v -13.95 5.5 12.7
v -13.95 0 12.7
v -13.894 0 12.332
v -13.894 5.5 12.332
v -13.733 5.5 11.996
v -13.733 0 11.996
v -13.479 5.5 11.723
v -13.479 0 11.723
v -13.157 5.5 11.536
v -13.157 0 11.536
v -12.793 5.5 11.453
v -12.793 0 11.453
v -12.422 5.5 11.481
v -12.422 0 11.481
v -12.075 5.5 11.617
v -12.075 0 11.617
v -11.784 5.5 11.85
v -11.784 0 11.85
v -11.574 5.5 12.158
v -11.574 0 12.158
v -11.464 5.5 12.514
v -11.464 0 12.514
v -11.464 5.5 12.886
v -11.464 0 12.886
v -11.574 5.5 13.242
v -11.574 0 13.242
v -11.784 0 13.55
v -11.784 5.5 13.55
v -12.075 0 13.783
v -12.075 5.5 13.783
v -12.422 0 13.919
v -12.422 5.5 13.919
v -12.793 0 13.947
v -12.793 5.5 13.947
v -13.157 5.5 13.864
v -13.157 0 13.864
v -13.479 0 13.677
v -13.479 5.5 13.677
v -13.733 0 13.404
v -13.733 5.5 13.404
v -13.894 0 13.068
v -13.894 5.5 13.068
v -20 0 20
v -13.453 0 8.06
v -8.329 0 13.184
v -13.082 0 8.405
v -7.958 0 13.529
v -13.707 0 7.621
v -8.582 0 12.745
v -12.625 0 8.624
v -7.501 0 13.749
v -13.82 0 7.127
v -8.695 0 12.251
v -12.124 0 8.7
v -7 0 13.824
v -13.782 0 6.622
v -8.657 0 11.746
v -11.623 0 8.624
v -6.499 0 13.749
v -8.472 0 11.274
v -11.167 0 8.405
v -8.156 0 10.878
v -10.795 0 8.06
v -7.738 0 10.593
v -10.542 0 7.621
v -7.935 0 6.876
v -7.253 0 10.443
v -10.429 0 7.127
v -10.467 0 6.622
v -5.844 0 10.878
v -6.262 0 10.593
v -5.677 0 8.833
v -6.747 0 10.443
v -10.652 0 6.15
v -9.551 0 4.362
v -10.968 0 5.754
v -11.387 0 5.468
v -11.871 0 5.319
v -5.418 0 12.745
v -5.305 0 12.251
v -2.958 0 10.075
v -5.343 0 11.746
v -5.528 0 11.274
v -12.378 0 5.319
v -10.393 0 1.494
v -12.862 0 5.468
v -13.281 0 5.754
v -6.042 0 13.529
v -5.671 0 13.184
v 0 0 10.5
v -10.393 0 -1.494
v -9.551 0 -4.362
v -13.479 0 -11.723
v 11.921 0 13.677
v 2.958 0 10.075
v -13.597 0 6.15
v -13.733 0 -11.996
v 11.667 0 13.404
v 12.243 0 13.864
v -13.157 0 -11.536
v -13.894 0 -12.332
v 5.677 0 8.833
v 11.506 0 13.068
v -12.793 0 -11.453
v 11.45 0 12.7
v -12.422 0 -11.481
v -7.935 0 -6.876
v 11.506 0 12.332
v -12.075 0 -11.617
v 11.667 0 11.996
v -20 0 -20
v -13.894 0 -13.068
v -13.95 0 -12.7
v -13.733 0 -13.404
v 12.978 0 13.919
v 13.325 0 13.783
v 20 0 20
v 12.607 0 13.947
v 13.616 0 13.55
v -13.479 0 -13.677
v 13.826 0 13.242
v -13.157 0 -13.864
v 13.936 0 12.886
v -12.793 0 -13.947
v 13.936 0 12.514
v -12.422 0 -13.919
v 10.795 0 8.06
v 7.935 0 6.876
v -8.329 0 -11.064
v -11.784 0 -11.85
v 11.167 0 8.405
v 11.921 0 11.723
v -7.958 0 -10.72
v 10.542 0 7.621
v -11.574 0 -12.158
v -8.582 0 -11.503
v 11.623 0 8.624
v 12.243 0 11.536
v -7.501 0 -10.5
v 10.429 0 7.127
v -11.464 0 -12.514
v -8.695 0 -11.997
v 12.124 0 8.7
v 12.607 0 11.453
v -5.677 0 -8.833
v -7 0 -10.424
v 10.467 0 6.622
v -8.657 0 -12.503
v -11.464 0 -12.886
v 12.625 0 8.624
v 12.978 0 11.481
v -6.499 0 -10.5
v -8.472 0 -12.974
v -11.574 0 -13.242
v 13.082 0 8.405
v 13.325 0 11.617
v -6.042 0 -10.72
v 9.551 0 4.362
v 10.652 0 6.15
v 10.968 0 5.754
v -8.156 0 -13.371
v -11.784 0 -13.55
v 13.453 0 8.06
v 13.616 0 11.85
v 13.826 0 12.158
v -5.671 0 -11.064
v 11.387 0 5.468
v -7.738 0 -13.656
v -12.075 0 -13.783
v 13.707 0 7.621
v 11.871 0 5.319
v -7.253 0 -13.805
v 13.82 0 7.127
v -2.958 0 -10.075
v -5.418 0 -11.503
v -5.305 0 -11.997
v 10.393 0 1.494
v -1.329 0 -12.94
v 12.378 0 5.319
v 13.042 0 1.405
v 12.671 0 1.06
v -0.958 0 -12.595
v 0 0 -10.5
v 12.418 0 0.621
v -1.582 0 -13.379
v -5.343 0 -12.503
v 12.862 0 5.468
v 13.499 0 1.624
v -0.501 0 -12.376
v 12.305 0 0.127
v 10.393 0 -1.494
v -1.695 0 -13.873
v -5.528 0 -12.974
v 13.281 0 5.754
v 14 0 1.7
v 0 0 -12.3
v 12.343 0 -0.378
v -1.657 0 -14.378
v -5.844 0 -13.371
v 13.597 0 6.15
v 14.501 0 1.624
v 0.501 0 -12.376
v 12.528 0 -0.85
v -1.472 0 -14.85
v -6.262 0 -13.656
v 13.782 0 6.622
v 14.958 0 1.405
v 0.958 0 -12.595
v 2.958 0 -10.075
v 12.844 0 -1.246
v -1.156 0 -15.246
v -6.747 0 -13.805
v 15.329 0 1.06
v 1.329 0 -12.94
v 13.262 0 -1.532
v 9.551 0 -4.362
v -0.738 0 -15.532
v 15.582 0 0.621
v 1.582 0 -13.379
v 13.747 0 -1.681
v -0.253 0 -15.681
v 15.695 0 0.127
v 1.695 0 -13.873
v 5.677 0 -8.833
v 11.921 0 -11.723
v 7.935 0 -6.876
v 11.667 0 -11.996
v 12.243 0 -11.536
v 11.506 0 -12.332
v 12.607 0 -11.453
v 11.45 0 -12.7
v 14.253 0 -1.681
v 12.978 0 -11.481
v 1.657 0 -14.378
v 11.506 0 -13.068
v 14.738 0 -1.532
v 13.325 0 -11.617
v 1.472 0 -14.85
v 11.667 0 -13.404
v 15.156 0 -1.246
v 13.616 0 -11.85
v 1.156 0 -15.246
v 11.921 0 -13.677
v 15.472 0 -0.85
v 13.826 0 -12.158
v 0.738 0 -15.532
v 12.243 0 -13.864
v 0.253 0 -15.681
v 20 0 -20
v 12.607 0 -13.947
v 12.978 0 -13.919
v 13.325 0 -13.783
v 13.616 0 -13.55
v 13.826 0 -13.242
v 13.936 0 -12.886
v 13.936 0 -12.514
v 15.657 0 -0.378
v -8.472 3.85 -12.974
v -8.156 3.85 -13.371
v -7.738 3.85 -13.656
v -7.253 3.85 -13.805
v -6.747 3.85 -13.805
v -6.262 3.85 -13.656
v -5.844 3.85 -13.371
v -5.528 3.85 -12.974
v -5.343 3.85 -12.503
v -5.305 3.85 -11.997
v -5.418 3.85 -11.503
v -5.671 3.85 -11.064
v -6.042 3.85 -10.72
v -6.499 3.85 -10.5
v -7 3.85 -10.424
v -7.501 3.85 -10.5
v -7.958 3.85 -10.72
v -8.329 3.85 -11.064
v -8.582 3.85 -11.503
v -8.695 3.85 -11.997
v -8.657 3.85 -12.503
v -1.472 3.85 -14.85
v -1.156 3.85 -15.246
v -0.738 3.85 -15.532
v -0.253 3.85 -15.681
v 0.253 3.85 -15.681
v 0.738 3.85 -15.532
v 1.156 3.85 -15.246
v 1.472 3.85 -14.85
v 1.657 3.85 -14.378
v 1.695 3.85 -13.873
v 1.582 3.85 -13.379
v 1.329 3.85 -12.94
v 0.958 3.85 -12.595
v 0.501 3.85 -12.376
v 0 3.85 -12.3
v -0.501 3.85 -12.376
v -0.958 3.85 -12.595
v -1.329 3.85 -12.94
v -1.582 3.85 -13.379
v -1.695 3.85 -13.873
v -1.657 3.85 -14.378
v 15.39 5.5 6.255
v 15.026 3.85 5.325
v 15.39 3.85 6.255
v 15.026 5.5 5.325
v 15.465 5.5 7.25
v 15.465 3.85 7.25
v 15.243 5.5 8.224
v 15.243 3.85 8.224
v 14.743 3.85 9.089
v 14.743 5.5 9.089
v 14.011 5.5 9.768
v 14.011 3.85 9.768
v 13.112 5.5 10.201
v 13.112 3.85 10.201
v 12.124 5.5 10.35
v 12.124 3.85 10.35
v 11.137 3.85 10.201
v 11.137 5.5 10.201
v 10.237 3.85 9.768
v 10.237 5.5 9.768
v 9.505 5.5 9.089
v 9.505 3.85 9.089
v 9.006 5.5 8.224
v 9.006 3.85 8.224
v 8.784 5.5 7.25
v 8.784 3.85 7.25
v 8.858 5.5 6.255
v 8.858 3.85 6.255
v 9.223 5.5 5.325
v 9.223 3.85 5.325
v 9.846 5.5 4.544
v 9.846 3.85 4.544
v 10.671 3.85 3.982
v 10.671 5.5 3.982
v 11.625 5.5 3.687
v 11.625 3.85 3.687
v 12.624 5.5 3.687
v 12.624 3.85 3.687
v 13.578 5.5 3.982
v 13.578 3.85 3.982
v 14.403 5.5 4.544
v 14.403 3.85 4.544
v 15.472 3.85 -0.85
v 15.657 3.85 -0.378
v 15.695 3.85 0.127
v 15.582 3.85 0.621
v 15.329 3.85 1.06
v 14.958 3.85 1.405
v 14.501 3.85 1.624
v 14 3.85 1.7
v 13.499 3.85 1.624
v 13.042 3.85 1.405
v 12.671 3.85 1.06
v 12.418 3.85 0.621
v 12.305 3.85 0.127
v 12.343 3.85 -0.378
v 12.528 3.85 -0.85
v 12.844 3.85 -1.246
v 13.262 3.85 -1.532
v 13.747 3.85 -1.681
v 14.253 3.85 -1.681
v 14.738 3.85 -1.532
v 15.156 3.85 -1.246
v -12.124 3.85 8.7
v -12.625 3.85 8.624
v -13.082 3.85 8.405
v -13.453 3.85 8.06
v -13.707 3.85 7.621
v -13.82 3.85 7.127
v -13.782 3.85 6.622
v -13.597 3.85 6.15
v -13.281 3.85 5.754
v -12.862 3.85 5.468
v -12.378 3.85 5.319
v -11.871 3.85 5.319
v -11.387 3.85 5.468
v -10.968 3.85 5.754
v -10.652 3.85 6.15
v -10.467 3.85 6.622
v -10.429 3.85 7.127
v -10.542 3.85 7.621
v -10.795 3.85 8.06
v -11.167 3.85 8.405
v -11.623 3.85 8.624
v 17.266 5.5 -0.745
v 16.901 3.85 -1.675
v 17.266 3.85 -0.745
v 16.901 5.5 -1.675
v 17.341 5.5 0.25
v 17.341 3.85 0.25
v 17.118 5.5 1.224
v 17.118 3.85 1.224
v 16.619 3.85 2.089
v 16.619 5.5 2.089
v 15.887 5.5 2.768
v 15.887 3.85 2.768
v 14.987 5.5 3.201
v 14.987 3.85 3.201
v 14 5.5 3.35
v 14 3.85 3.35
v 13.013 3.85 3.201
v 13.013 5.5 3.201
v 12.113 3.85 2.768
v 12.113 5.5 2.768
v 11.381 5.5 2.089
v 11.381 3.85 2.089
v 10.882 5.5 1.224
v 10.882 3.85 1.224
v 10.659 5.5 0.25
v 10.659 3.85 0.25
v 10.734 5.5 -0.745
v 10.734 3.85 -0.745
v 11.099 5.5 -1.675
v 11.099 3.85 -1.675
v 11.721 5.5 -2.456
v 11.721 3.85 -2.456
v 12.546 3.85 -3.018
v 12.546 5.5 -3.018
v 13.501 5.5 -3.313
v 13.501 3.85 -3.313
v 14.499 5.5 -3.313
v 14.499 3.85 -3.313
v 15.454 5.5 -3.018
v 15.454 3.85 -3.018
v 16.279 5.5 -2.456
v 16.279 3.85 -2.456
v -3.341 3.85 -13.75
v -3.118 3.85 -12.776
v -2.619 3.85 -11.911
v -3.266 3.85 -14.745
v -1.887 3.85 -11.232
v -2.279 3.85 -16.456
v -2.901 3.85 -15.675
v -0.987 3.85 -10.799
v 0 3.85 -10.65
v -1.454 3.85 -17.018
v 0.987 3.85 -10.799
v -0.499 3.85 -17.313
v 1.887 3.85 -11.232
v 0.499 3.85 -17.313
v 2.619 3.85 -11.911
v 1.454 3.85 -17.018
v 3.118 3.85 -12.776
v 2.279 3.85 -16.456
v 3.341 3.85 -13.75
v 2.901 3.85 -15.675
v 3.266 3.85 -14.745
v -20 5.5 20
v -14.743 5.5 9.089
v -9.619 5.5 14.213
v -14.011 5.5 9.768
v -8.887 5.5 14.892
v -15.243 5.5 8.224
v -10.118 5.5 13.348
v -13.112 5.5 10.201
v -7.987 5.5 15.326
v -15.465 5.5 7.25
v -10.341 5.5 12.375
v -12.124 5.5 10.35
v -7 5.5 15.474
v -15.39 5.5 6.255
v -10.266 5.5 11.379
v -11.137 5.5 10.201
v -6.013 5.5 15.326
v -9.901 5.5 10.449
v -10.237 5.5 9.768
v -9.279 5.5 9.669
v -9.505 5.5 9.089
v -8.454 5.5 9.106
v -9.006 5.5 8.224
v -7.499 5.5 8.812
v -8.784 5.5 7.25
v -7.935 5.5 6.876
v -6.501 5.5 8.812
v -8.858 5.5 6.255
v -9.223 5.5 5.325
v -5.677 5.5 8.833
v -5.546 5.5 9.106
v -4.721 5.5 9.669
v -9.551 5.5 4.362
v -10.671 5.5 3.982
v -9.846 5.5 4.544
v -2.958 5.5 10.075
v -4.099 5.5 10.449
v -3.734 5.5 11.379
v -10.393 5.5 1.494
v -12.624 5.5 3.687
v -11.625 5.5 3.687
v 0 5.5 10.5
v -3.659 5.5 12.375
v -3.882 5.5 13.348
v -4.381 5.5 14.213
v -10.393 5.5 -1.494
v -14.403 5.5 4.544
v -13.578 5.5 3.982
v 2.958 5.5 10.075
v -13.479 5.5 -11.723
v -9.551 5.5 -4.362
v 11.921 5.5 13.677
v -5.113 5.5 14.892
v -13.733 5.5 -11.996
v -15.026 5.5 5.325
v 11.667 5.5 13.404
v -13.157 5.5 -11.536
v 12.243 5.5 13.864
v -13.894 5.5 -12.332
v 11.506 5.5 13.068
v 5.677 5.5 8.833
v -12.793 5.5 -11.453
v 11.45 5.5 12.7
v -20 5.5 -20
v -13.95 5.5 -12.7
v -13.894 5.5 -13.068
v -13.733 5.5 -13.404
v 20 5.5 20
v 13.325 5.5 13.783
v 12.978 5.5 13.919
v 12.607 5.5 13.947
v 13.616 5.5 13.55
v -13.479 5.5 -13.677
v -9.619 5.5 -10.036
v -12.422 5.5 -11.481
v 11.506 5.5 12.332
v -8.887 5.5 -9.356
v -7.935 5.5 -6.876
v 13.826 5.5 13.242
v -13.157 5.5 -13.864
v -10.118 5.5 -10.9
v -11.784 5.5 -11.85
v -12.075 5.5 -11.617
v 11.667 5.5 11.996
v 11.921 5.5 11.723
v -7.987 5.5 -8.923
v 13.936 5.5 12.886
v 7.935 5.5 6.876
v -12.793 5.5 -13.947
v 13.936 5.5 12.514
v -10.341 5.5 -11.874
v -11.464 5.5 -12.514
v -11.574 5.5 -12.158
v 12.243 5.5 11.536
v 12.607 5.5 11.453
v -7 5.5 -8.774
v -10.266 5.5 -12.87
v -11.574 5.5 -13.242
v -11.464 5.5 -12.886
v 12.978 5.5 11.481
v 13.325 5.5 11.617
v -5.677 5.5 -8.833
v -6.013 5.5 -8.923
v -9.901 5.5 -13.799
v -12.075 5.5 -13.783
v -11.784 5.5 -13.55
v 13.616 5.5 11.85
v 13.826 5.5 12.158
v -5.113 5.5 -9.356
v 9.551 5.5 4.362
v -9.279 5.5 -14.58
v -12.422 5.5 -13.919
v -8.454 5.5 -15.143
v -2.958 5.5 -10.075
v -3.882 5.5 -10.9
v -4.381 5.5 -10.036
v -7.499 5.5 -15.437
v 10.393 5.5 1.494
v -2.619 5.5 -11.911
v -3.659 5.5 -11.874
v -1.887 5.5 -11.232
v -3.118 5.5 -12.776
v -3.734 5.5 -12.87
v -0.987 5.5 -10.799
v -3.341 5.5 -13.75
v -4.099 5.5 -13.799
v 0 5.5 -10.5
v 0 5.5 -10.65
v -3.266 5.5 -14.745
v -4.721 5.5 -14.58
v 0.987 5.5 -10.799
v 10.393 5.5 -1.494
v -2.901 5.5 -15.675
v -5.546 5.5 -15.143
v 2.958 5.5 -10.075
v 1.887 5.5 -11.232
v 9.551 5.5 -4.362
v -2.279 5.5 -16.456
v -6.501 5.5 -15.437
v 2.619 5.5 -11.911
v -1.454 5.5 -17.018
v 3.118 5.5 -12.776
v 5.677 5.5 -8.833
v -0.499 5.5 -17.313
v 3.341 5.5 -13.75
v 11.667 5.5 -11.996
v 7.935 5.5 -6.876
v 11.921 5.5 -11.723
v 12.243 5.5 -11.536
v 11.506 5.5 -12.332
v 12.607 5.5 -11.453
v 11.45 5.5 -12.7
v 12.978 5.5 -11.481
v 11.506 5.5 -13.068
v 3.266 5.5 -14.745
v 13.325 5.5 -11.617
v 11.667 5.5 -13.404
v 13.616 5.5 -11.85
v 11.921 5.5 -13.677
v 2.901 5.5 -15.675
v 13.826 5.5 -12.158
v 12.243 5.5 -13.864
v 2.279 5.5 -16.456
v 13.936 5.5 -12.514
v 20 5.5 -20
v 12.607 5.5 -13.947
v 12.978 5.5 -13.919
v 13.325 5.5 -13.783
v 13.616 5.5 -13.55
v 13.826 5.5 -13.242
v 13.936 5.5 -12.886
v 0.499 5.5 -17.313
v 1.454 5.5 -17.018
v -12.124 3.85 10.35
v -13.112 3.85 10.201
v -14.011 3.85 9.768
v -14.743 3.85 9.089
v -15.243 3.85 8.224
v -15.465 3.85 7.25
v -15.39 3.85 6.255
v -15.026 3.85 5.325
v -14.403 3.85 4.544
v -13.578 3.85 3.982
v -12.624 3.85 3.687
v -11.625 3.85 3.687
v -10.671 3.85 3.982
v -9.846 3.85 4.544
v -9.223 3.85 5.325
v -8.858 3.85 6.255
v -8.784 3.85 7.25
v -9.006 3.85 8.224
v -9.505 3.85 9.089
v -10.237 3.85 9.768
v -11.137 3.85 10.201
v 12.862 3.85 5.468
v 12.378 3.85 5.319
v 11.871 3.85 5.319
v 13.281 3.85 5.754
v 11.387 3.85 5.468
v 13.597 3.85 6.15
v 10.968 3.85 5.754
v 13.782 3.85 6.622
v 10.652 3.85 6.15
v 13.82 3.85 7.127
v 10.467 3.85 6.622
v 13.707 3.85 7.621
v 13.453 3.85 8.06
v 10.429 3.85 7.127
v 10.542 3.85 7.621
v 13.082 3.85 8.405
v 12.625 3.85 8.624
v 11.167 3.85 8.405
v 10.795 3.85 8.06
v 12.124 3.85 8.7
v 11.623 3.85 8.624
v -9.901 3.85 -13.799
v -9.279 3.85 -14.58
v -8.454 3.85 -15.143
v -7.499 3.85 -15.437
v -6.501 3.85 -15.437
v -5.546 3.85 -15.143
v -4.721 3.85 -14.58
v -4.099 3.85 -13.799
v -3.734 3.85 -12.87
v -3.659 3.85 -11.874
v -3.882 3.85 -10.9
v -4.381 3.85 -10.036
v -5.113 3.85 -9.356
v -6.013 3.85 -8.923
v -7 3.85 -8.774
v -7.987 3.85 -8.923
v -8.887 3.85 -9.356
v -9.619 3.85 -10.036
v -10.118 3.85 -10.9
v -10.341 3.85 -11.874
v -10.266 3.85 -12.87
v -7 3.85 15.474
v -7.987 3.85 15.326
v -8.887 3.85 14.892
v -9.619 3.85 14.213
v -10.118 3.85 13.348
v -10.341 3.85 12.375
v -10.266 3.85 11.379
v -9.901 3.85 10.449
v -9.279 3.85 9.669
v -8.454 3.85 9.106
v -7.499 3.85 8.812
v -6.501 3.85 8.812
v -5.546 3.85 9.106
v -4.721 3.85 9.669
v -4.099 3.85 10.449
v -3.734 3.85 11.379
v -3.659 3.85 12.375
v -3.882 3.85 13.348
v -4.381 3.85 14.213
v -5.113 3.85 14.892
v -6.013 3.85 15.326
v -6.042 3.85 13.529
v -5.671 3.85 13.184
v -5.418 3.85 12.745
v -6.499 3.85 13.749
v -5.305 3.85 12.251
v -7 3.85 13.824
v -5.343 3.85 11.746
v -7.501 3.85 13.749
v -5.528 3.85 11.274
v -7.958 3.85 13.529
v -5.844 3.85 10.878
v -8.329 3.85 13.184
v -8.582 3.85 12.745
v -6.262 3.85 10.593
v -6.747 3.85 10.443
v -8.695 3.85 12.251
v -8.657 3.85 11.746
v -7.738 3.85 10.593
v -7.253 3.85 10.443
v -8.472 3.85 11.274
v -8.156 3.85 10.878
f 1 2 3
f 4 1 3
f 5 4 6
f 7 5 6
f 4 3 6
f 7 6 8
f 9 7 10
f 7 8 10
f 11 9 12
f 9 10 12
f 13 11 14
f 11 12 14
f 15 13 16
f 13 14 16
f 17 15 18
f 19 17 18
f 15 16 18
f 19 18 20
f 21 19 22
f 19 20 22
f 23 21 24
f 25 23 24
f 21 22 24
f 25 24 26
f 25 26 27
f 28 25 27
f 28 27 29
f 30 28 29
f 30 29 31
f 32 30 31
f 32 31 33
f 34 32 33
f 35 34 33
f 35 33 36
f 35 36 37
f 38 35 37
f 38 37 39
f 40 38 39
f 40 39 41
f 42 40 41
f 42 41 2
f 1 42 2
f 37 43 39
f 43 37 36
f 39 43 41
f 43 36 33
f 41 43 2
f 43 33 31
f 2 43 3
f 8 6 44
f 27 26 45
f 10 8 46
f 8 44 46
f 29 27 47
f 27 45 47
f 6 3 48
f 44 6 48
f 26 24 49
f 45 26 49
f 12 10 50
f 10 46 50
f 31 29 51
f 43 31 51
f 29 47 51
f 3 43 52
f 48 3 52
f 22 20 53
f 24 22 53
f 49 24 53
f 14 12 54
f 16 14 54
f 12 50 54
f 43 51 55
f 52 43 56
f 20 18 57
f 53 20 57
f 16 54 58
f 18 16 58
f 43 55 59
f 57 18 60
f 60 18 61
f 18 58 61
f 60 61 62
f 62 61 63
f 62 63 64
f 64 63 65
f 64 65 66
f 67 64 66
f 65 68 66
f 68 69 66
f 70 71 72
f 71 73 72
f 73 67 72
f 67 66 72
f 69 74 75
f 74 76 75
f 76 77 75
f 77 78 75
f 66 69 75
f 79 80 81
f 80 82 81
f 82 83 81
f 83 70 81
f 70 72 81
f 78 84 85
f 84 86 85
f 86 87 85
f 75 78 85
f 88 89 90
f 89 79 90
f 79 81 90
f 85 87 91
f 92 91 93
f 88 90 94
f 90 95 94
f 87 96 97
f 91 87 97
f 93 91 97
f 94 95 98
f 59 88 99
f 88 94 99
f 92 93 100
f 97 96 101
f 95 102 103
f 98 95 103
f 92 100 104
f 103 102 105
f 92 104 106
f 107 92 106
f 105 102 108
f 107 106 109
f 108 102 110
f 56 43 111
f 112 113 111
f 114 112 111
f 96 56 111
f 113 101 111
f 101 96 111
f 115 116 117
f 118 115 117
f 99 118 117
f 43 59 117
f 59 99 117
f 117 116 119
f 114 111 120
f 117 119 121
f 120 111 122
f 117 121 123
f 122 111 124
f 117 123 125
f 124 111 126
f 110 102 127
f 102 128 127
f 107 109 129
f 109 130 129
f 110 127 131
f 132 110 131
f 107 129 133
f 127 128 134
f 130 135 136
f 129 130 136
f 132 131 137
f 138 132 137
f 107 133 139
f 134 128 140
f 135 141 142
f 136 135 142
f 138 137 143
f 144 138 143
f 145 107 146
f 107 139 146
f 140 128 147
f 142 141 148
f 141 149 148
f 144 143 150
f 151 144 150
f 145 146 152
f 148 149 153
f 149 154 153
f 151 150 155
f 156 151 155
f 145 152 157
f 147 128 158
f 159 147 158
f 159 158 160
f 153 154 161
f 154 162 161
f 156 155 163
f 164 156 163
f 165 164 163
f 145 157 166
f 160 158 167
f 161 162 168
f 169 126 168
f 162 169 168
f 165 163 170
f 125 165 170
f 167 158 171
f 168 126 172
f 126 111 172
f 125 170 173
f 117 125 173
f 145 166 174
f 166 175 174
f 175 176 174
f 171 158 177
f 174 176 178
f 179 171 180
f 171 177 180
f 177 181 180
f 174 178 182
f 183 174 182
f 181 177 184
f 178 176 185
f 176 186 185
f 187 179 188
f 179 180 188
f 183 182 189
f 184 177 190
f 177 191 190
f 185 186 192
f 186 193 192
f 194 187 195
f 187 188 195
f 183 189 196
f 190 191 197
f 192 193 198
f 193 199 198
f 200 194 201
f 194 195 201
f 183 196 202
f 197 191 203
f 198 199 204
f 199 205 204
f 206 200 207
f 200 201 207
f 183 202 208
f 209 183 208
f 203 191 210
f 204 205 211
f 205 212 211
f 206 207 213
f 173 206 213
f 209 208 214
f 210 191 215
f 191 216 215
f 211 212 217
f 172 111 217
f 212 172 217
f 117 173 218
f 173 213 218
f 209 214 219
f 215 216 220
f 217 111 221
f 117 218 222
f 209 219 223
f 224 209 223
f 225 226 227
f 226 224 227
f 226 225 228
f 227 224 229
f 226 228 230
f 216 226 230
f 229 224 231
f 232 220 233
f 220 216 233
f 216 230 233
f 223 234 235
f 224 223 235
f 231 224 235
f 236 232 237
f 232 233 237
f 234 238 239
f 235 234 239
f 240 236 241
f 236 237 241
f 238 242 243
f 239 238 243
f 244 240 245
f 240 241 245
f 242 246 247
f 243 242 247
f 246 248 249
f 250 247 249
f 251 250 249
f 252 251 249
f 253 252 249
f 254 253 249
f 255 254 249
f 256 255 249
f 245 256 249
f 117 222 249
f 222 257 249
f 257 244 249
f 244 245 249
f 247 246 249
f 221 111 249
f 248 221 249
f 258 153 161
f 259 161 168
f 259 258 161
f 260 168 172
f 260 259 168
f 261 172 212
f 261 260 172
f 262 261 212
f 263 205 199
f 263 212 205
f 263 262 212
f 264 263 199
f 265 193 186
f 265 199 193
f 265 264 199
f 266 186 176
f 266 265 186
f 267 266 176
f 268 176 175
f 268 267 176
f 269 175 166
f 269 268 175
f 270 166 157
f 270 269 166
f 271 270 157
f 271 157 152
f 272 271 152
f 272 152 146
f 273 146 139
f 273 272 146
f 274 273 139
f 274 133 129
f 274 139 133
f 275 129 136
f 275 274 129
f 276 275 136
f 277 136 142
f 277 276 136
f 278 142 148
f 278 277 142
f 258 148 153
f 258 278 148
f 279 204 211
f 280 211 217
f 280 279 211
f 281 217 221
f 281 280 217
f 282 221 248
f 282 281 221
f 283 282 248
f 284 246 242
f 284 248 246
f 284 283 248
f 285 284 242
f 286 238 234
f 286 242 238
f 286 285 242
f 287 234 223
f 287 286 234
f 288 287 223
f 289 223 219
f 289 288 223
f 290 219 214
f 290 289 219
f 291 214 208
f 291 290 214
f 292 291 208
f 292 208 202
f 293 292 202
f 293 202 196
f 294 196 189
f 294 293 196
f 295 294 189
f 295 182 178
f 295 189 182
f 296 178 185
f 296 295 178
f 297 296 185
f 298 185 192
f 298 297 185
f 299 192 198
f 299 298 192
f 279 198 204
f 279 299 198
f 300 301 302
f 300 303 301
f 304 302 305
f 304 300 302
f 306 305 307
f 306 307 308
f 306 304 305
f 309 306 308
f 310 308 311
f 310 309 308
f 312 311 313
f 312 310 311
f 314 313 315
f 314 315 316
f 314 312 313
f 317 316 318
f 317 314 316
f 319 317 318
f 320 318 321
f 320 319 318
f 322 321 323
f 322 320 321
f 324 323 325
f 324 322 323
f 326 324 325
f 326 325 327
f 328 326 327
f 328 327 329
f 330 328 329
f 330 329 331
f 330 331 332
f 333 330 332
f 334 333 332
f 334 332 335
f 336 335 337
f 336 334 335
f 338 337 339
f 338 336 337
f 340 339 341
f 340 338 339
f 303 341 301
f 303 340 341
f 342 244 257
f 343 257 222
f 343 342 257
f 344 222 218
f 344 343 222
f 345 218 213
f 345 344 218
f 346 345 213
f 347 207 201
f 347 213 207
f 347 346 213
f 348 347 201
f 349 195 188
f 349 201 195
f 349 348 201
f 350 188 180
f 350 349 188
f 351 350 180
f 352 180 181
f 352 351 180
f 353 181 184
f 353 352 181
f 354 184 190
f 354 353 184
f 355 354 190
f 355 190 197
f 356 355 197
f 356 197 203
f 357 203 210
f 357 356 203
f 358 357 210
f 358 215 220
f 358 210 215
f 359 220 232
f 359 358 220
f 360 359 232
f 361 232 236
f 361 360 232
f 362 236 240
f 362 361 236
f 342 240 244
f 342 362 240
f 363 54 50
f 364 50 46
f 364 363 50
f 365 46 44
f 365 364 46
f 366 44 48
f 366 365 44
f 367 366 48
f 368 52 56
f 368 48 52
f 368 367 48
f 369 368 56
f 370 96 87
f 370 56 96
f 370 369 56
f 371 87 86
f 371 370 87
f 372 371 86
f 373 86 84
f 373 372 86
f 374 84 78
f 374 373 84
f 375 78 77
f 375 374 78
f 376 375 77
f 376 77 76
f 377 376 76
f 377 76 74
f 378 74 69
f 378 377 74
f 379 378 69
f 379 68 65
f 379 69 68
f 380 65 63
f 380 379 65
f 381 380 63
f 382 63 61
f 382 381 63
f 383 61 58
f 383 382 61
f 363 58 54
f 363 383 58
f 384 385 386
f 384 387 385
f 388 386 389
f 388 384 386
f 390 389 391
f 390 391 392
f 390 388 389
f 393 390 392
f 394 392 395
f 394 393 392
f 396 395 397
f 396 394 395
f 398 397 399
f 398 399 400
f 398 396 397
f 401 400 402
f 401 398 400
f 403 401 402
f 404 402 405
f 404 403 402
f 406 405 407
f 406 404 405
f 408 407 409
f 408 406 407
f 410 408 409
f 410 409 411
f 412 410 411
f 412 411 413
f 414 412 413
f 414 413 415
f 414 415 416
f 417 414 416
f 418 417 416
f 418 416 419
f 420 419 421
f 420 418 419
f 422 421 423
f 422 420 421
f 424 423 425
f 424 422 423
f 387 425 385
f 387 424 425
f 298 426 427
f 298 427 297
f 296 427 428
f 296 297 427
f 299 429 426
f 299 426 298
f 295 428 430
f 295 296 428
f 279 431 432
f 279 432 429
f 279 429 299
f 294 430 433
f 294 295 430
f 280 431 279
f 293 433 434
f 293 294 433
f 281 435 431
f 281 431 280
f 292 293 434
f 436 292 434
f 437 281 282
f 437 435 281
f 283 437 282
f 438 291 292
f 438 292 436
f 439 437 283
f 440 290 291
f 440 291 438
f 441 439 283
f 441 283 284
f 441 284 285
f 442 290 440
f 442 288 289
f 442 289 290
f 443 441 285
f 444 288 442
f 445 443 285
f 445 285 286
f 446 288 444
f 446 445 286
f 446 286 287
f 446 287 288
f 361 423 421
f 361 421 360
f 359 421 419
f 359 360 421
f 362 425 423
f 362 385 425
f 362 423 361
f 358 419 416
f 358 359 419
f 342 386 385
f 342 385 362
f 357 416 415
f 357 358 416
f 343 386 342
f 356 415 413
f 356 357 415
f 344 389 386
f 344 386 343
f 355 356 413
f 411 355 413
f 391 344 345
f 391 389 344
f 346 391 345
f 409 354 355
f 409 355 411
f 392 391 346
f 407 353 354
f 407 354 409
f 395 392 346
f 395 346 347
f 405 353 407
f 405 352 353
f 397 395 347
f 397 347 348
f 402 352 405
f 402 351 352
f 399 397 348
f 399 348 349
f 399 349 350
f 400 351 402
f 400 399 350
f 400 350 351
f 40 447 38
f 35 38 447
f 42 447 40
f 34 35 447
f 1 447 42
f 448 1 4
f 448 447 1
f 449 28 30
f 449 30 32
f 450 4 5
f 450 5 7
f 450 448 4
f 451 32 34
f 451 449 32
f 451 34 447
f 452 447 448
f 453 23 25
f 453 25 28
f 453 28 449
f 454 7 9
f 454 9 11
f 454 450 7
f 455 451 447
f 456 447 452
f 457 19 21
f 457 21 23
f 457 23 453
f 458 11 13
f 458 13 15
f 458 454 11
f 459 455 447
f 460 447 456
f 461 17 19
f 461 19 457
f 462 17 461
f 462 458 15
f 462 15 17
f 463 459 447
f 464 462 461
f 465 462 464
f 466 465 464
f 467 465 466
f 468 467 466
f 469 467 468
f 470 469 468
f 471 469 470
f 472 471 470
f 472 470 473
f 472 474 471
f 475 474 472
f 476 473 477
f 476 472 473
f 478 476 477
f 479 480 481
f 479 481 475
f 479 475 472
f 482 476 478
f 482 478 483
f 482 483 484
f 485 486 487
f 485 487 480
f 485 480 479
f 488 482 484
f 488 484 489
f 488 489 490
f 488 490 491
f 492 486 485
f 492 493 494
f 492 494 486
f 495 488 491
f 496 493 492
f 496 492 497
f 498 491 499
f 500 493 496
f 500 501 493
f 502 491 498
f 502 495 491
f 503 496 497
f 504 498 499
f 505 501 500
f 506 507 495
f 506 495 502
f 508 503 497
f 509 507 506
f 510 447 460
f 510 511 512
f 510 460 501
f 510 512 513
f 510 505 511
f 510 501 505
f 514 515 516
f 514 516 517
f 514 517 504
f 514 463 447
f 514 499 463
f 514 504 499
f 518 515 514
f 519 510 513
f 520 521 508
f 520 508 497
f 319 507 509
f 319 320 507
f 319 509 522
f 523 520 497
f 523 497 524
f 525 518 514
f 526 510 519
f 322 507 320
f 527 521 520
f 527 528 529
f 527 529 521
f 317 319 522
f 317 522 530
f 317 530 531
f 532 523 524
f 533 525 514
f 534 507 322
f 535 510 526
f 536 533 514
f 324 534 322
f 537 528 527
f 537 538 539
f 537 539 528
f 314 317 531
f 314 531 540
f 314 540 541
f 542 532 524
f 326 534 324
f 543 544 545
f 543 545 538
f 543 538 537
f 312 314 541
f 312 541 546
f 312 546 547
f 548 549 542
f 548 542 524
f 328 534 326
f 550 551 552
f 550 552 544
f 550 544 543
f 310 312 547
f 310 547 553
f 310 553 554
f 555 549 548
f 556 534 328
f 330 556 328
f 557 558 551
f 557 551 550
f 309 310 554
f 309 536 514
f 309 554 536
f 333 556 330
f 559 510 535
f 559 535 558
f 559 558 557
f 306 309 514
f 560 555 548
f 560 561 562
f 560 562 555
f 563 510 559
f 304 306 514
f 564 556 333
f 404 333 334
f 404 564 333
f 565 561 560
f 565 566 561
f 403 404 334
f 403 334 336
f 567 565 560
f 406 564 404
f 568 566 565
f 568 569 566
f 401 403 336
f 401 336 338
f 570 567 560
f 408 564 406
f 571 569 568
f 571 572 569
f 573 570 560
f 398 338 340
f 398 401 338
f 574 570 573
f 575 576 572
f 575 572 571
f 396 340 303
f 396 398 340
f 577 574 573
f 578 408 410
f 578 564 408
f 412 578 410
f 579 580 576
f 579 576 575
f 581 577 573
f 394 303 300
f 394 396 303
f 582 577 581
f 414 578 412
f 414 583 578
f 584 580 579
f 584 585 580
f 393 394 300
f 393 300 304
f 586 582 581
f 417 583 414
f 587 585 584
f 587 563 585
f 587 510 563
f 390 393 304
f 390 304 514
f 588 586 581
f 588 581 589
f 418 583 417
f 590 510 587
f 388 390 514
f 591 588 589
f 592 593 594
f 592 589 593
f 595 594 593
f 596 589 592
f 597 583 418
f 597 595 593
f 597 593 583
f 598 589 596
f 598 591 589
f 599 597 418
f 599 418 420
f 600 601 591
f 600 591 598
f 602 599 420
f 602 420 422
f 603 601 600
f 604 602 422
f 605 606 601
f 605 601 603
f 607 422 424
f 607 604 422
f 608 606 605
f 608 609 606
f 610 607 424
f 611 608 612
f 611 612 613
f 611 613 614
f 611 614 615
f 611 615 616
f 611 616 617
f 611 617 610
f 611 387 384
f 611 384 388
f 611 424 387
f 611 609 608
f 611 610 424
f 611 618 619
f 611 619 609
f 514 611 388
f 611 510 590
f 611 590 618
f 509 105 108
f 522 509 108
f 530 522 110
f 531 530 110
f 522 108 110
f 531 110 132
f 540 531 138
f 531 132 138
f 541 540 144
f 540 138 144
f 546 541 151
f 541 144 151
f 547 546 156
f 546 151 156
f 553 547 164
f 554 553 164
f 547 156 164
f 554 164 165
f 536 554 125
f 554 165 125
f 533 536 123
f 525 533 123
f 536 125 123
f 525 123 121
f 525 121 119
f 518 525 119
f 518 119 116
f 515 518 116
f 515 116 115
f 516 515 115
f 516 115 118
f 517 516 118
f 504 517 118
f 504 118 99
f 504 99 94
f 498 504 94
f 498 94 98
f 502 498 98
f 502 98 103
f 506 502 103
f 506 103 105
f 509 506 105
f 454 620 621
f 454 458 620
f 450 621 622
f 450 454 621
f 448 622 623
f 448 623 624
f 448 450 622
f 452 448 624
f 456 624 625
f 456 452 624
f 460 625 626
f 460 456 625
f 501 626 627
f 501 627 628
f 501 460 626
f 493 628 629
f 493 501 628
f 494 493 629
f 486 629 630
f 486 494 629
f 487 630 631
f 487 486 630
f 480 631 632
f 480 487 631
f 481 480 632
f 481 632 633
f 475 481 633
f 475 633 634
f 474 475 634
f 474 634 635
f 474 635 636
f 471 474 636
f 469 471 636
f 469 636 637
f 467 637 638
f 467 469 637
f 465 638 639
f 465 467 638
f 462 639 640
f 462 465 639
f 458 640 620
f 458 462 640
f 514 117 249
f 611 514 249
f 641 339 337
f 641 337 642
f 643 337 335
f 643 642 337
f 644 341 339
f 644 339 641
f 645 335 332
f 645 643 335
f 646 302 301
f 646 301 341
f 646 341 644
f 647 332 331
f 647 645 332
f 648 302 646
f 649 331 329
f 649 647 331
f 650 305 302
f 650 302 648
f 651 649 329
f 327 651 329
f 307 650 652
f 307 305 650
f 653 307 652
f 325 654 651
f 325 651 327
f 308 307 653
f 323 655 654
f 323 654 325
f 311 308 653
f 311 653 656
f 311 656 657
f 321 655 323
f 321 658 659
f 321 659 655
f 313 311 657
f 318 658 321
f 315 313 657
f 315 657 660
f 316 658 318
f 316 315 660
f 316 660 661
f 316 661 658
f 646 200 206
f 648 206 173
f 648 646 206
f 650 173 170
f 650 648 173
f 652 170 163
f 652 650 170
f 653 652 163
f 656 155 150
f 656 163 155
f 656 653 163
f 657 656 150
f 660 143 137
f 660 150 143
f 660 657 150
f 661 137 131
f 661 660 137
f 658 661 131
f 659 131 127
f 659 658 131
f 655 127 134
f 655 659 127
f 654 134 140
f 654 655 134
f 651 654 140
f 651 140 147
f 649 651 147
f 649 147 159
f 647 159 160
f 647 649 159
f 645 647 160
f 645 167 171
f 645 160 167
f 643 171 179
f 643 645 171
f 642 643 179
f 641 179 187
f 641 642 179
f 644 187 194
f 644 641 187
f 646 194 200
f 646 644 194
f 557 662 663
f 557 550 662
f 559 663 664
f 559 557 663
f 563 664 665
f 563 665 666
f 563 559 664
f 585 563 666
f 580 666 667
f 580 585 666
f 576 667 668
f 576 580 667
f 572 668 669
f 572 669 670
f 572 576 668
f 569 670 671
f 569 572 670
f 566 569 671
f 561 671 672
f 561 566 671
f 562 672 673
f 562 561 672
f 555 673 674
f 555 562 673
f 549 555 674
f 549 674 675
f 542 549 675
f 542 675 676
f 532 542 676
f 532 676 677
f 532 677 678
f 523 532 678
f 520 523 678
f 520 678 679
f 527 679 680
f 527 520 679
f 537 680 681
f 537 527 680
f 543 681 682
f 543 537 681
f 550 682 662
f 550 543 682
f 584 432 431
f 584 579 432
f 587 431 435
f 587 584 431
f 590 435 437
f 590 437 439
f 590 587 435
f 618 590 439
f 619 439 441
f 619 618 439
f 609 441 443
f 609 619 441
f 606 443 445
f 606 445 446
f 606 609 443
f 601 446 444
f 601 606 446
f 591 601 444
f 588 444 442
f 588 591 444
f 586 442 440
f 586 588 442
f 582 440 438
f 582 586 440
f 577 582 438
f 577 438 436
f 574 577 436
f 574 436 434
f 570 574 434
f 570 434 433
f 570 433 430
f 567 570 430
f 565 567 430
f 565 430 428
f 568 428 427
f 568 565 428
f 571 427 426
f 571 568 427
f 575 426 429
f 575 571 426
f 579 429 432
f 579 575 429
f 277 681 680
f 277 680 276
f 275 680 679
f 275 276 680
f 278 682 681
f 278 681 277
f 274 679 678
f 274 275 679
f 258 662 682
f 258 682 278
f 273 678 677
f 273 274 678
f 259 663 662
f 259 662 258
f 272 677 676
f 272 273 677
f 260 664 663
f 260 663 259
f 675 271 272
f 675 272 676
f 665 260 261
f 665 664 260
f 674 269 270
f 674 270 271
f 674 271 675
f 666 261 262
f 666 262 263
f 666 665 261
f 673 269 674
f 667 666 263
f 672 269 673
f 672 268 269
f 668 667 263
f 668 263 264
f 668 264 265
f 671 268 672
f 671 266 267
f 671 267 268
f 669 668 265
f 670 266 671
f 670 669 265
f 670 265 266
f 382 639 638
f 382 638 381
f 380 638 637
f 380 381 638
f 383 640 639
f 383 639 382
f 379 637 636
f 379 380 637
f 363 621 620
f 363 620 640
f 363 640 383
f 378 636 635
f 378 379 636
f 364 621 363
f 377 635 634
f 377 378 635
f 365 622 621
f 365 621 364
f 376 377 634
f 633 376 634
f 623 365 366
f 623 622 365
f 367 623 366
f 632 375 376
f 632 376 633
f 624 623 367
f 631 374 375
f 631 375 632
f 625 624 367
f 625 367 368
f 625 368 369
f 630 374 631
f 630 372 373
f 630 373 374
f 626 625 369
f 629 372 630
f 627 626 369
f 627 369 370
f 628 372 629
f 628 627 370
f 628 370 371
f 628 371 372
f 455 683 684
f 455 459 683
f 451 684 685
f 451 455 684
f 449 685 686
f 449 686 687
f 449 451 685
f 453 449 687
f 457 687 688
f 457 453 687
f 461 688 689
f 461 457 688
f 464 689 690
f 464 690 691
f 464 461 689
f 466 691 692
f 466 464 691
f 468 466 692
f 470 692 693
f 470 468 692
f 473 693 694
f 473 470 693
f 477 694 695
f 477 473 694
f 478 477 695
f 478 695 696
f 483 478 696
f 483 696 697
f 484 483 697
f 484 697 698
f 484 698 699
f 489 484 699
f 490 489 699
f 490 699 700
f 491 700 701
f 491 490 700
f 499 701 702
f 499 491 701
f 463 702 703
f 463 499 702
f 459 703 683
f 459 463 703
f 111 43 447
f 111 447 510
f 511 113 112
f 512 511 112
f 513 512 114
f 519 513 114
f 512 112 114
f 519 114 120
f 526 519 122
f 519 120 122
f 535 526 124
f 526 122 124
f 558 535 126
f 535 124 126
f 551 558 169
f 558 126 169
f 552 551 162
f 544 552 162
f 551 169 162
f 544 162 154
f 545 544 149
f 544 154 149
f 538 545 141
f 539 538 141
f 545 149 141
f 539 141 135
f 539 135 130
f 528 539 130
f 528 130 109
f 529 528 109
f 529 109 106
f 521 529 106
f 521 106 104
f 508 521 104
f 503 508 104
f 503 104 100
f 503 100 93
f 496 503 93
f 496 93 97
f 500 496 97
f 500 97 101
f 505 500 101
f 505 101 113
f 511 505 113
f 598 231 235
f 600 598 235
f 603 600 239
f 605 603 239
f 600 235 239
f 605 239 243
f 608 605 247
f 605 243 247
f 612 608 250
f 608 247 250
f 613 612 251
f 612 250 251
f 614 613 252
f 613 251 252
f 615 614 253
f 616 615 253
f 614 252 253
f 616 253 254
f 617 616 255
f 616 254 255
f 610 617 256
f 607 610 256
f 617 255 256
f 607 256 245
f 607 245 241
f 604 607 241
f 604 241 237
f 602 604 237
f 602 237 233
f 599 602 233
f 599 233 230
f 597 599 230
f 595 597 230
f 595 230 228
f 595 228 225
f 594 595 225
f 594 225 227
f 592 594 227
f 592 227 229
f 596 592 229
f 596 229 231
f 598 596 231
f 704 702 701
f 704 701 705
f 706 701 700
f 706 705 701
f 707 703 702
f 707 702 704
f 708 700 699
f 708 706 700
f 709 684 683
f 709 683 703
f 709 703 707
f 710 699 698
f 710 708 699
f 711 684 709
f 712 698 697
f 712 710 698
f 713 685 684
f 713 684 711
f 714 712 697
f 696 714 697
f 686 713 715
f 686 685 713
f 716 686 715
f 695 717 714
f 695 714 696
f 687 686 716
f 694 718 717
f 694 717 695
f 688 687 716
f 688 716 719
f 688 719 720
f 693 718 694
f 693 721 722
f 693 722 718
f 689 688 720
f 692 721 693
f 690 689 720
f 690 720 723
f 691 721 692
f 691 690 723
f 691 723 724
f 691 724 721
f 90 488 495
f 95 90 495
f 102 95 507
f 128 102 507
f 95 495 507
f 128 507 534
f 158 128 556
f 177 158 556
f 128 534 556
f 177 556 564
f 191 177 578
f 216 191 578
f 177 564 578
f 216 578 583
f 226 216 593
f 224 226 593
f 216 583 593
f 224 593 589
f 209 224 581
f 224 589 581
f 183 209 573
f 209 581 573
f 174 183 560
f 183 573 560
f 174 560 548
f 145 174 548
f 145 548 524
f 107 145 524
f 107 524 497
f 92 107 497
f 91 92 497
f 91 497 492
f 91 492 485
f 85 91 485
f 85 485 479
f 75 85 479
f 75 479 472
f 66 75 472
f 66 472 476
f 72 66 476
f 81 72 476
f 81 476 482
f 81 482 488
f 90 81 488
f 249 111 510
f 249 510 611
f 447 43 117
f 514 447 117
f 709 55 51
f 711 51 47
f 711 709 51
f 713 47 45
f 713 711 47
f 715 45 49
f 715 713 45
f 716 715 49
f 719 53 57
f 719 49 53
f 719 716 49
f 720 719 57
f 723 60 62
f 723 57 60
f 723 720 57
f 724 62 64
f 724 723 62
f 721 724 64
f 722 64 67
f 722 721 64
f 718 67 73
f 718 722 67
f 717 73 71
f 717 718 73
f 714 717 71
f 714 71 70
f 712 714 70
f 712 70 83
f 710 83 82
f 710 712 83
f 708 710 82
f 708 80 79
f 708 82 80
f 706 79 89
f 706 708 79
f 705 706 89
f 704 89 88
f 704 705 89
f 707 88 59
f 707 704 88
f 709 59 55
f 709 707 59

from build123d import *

# Parameters (mm, degrees)
SKETCH1_W                      = 40
SKETCH1_H                      = 40
BOSS_EXTRUDE1_DEPTH            = 5.5
CUT_EXTRUDE1_REACH             = 30.814
SKETCH2_R                      = 10.5
M3X0_5_TAPPED_HOLE1_D          = 2.5
M3X0_5_TAPPED_HOLE1_DEPTH      = 15.24
M3X0_5_TAPPED_HOLE1_TIP        = 0.751075774
CBORE_FOR_M3_SBHCS1_AT_2_COUNT = 2
CBORE_FOR_M3_SBHCS1_AT_2_PITCH = 7.246933263
CIRPATTERN1_COUNT              = 3


with BuildPart() as part:
    # Sketch1 → Boss-Extrude1 (new body)
    with BuildSketch(Plane(origin=(0, 0, 0), x_dir=(1, 0, 0), z_dir=(0, 1, 0))):
        Rectangle(SKETCH1_W, SKETCH1_H)
    extrude(amount=BOSS_EXTRUDE1_DEPTH)

    # Sketch2 → Cut-Extrude1 (cut, up to next)
    with BuildSketch(Plane(origin=(0, 5.5, 0), x_dir=(1, 0, 0), z_dir=(0, 1, 0)), mode=Mode.PRIVATE) as cut_extrude1_sk1:
        with Locations(Location((0, 0, 0), (0, 0, 270))):
            Circle(SKETCH2_R)
    cut_extrude1_tool1 = extrude(cut_extrude1_sk1.sketch, amount=-CUT_EXTRUDE1_REACH, mode=Mode.PRIVATE) & part.part
    add(cut_extrude1_tool1.solids().sort_by_distance((0, 5.5, 0))[0], mode=Mode.SUBTRACT)

    # M3x0.5 Tapped Hole1
    with Locations(Plane(origin=(0, 5.5, 0), x_dir=(1, 0, 0), z_dir=(0, 1, 0))):
        with Locations((-12.7, -12.7), (-12.7, 12.7), (12.7, 12.7), (12.7, -12.7)):
            Hole(M3X0_5_TAPPED_HOLE1_D / 2, depth=M3X0_5_TAPPED_HOLE1_DEPTH)
            with Locations((0, 0, -(M3X0_5_TAPPED_HOLE1_DEPTH + M3X0_5_TAPPED_HOLE1_TIP / 2))):  # 118° drill point
                Cone(0, M3X0_5_TAPPED_HOLE1_D / 2, M3X0_5_TAPPED_HOLE1_TIP, mode=Mode.SUBTRACT)

    # Sketch10 → CBORE for M3 SBHCS1 (revolve, cut)
    with BuildSketch(Plane(origin=(-12.124355653, 5.5, 7), x_dir=(0, 0, 1), z_dir=(1, 0, 0))):
        Polygon((0, 0), (0, 16.261463052), (1.7, 15.24), (1.7, 1.65), (3.35, 1.65), (3.35, 0), align=None)
    cbore_for_m3_sbhcs1 = revolve(axis=Axis((-12.124355653, 11.85, 7), (0, -1, 0)), mode=Mode.SUBTRACT)

    # CBORE for M3 SBHCS1 at 2: CBORE for M3 SBHCS1 ×2
    with Locations(*[Vector(0.7071067811865501, 0, 0.7071067811865449) * (i * CBORE_FOR_M3_SBHCS1_AT_2_PITCH) for i in range(1, CBORE_FOR_M3_SBHCS1_AT_2_COUNT)]):
        add(cbore_for_m3_sbhcs1, mode=Mode.SUBTRACT)

    # CirPattern1: CBORE for M3 SBHCS1 ×3 about axis
    cirpattern1_axis = Axis((0, 0, 0), (0, 1, 0))
    for i in range(1, CIRPATTERN1_COUNT):
        add(cbore_for_m3_sbhcs1.rotate(cirpattern1_axis, i * 360 / CIRPATTERN1_COUNT), mode=Mode.SUBTRACT)

    # CirPattern1 copy 1 sketch → CirPattern1 copy 1 (revolve, cut)
    with BuildSketch(Plane(origin=(14, 5.5, 0), x_dir=(0.8660254037844387, 0, -0.4999999999999998), z_dir=(-0.4999999999999998, 0, -0.8660254037844387))):
        Polygon((0, 0), (0, 16.261463052), (1.7, 15.24), (1.7, 1.65), (3.35, 1.65), (3.35, 0), align=None)
    revolve(axis=Axis((14, 11.85, 0), (0, -1, 0)), mode=Mode.SUBTRACT)

    # CirPattern1 copy 2 sketch → CirPattern1 copy 2 (revolve, cut)
    with BuildSketch(Plane(origin=(-7, 5.5, -12.124355653), x_dir=(-0.8660254037844384, 0, -0.5000000000000004), z_dir=(-0.5000000000000004, 0, 0.8660254037844384))):
        Polygon((0, 0), (0, 16.261463052), (1.7, 15.24), (1.7, 1.65), (3.35, 1.65), (3.35, 0), align=None)
    revolve(axis=Axis((-7, 11.85, -12.124355653), (0, -1, 0)), mode=Mode.SUBTRACT)


solid = part.part
